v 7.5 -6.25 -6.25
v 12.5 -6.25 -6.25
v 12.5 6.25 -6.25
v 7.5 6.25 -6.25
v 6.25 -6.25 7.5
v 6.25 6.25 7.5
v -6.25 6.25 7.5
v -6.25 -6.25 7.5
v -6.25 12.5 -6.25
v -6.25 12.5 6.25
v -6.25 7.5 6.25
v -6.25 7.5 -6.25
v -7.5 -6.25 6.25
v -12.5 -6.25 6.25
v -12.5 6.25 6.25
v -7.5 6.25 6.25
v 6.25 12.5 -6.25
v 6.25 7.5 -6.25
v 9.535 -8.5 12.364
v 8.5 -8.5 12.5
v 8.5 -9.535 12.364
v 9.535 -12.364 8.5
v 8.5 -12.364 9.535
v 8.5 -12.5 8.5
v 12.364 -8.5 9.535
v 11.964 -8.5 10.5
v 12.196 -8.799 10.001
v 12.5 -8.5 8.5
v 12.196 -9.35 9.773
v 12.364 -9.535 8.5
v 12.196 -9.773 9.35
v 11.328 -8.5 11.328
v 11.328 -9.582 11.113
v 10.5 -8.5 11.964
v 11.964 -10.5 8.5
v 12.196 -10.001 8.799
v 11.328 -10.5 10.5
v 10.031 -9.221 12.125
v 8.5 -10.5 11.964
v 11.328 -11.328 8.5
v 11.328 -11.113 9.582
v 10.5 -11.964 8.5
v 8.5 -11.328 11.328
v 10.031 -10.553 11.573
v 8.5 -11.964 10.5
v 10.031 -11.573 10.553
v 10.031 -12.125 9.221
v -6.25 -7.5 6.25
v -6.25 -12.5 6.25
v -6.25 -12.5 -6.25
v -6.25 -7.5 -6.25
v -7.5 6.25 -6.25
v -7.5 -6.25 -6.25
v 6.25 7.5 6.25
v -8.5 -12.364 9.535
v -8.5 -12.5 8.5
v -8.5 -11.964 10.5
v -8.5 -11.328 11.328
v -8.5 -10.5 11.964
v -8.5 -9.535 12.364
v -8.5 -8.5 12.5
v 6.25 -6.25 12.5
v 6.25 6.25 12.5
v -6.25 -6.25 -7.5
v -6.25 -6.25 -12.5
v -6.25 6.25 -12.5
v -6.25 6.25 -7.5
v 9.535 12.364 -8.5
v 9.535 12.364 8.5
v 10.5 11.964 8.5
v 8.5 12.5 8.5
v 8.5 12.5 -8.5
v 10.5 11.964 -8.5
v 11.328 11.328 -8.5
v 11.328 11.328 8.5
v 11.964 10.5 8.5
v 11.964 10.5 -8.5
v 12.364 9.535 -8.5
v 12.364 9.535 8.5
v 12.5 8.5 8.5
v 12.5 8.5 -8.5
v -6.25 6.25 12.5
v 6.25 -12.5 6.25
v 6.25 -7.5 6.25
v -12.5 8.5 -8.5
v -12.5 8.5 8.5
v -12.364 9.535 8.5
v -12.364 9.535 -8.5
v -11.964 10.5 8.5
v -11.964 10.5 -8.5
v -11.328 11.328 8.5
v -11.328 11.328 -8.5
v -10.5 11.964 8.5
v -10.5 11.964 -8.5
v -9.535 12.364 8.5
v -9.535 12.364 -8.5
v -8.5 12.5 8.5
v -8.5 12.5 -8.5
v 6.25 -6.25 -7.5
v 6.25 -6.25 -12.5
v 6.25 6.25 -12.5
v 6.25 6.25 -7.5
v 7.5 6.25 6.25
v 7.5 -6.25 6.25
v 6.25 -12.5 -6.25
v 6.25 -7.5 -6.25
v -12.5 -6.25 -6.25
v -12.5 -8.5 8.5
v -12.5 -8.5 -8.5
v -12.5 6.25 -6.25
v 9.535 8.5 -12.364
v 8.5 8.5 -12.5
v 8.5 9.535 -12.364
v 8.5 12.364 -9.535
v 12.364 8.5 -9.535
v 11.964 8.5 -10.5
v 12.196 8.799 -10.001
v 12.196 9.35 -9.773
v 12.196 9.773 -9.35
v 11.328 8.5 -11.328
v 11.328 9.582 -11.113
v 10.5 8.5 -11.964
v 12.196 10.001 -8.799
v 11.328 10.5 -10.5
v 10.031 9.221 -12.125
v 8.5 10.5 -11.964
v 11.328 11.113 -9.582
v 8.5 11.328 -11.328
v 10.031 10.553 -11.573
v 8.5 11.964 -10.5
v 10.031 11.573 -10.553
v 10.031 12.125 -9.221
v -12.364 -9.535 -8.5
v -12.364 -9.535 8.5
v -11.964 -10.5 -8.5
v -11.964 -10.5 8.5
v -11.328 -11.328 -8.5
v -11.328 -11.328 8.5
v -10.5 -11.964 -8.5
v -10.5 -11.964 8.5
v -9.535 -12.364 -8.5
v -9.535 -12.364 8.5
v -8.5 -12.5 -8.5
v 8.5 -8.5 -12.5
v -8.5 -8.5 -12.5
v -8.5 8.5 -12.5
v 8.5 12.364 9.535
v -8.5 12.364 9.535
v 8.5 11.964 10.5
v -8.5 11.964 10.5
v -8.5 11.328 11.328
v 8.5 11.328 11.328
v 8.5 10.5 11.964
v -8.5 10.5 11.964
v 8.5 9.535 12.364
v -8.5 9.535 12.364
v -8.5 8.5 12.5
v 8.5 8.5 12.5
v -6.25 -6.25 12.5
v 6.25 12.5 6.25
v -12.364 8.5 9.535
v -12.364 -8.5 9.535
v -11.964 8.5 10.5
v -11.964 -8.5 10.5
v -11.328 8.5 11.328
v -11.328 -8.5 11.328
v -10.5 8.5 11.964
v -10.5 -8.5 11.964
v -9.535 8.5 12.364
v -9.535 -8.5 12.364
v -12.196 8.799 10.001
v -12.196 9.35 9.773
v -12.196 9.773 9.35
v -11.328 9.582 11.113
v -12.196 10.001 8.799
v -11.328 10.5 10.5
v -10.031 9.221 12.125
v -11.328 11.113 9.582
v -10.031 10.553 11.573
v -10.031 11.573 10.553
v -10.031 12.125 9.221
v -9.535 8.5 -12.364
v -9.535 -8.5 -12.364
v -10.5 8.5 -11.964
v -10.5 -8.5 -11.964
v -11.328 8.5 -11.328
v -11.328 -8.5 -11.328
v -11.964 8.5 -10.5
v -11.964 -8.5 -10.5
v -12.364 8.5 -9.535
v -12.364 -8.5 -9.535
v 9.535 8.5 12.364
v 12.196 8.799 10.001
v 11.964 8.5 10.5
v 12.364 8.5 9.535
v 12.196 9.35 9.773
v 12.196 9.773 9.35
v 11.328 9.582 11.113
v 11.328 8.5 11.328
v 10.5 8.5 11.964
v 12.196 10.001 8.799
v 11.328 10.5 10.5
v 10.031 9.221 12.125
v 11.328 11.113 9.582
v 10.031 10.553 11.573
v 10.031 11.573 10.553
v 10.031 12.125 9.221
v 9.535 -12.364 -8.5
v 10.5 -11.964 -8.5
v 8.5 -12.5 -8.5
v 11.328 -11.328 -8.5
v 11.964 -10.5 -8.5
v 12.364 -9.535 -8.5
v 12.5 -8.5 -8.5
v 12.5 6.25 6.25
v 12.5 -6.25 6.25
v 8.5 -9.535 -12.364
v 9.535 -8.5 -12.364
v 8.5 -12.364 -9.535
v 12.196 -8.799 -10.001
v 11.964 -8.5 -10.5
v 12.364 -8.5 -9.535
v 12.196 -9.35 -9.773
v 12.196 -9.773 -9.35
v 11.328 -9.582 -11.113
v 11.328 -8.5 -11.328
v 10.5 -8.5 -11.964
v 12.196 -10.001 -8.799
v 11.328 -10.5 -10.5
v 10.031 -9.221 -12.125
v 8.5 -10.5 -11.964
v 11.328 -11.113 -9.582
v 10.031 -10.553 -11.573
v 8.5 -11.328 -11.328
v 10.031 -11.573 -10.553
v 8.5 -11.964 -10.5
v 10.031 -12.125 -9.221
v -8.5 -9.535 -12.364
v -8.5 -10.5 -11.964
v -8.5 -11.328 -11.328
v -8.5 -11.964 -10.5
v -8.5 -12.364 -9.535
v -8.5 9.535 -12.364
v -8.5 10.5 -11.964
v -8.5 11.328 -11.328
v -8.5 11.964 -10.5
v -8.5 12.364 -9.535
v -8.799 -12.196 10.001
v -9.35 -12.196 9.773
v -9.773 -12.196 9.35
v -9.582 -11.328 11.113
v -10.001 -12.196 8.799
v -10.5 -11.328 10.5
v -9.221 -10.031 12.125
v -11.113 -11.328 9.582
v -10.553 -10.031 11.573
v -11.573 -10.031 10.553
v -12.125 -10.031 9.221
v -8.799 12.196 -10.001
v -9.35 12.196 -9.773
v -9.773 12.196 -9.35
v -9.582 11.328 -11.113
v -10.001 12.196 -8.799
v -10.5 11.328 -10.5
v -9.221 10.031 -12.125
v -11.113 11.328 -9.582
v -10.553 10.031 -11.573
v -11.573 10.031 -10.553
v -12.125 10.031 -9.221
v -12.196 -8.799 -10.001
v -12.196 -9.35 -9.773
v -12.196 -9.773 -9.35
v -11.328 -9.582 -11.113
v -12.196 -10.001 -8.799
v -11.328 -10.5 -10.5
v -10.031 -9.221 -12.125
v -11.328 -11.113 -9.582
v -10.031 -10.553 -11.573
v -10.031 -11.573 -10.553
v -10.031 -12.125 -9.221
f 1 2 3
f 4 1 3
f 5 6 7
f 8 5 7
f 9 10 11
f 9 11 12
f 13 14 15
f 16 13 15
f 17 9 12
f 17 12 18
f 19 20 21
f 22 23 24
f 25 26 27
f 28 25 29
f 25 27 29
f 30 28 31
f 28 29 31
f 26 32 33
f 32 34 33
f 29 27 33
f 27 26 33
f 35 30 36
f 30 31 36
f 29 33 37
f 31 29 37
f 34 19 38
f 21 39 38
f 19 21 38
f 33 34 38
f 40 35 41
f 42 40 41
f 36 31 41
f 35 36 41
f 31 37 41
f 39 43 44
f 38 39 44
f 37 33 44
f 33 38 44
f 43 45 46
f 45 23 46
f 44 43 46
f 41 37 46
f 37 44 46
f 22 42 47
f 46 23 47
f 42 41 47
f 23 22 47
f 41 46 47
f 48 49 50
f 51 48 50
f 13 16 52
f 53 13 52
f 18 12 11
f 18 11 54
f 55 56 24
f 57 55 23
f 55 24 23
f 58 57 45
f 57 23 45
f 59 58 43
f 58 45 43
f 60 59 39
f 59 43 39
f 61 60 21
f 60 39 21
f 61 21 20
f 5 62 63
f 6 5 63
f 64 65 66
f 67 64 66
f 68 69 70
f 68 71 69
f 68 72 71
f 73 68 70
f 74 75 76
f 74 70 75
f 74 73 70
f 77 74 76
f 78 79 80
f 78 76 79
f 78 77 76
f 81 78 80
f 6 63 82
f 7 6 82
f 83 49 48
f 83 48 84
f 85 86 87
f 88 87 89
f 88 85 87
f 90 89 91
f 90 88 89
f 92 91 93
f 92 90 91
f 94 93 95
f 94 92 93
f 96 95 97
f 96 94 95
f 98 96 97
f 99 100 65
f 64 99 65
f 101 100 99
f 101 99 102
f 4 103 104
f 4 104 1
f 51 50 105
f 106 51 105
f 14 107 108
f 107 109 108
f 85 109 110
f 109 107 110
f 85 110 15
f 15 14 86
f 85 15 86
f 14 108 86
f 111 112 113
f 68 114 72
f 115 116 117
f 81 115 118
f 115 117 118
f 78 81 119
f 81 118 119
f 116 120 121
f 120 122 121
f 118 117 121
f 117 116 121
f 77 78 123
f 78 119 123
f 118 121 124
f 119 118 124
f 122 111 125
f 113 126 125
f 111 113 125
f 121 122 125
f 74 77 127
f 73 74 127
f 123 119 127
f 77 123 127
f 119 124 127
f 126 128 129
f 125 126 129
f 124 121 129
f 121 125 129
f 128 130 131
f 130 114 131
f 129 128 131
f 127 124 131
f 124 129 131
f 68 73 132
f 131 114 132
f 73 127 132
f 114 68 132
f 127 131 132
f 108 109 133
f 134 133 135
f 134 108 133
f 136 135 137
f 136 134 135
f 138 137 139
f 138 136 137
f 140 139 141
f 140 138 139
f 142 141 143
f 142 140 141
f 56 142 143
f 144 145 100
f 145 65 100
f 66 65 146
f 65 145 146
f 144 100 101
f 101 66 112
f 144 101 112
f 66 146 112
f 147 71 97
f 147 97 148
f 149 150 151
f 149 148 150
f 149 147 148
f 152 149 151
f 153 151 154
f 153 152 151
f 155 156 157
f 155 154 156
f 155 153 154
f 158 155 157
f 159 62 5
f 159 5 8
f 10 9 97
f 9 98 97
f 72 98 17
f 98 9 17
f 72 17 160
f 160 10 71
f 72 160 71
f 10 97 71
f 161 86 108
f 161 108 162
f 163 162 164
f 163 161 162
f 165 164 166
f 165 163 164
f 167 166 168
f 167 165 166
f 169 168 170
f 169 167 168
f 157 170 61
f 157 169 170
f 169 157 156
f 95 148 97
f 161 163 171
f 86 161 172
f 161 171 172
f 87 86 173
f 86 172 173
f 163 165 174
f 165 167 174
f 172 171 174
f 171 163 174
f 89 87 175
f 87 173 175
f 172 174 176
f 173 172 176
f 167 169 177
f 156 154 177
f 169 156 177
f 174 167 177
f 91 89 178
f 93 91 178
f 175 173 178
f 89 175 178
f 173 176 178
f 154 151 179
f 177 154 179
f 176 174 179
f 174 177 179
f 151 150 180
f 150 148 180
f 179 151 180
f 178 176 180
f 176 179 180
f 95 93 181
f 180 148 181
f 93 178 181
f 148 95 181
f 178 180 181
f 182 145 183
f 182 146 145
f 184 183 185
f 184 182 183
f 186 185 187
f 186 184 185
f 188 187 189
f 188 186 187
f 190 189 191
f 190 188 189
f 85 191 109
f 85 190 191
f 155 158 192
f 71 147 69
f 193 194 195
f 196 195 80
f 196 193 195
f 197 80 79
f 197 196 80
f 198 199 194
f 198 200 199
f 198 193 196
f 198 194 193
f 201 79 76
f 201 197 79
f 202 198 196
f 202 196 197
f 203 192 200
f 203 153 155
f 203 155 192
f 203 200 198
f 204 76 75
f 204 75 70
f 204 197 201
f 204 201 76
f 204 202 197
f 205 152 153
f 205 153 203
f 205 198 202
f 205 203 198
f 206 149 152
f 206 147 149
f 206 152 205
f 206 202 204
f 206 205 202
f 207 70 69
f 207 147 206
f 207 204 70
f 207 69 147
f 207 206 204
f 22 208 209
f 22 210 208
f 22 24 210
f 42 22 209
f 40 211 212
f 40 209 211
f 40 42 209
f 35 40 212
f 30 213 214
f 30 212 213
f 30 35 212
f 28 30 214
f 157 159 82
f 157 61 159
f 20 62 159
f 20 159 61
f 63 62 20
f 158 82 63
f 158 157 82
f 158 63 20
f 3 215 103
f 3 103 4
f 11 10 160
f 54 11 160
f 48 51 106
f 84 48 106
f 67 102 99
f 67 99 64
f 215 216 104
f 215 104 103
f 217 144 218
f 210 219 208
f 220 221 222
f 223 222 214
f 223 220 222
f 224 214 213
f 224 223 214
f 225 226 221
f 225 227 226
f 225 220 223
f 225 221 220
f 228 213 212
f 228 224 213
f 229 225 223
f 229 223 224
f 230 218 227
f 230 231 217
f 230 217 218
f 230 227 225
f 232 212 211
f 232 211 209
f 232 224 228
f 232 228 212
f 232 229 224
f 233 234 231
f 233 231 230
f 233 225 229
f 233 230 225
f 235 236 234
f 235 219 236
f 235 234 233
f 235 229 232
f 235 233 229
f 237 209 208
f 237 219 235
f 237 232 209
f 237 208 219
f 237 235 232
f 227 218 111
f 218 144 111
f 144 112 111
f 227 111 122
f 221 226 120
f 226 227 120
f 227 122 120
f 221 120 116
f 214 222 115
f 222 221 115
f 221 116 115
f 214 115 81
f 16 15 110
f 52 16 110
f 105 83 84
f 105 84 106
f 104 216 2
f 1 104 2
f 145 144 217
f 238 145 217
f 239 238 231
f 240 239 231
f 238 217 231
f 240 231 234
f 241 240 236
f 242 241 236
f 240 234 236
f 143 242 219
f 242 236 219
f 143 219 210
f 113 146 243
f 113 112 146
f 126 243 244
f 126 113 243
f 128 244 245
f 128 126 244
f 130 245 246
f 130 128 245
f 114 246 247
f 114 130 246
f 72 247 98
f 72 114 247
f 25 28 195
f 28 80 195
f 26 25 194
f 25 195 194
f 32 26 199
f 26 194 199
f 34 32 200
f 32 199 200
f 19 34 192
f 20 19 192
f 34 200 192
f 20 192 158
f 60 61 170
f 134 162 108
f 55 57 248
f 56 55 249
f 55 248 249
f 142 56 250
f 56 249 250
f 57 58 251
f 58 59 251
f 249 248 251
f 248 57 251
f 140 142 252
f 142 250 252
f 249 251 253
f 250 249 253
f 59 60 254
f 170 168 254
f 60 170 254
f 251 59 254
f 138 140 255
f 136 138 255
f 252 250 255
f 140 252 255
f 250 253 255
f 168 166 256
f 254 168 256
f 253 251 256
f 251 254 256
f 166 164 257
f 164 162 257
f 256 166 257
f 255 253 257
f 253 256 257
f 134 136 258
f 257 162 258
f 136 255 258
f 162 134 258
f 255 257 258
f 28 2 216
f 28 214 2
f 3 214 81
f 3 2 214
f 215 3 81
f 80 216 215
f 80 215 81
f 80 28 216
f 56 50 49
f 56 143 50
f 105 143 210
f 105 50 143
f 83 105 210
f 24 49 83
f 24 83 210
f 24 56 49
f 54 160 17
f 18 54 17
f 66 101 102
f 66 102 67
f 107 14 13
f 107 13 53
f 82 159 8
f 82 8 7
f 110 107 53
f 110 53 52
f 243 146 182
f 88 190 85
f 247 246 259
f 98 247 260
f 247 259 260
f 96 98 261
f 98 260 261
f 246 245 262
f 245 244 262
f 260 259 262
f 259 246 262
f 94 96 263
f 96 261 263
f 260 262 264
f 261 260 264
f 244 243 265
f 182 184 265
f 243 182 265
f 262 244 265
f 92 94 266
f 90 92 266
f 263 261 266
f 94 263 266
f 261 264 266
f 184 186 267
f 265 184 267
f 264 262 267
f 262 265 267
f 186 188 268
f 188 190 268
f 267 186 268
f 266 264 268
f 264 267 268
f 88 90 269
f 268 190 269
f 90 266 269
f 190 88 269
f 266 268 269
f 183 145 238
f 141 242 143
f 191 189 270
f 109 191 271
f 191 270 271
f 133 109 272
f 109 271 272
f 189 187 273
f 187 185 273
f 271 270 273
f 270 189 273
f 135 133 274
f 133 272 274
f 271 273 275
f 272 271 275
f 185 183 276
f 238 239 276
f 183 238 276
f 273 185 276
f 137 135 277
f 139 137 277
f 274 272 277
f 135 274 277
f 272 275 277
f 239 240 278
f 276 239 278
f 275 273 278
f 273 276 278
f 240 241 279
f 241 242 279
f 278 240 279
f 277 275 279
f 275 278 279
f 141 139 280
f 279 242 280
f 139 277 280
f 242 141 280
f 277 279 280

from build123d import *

# Parameters (mm, degrees)
SKETCH1_W           = 25
SKETCH1_H           = 25
SKETCH1_W_2         = 12.5
SKETCH1_H_2         = 12.5
BOSS_EXTRUDE1_DEPTH = 12.5
SKETCH2_W           = 12.5
SKETCH2_H           = 12.5
CUT_EXTRUDE1_DEPTH  = 5
SKETCH3_W           = 12.5
SKETCH3_H           = 12.5
CUT_EXTRUDE2_DEPTH  = 5
SKETCH4_W           = 12.5
SKETCH4_H           = 12.5
CUT_EXTRUDE3_DEPTH  = 5
FILLET1_R           = 4


with BuildPart() as part:
    # Sketch1 → Boss-Extrude1 (new, symmetric)
    # profile 1 of 2: a face of its own
    with BuildSketch(Plane.XY):
        Rectangle(SKETCH1_W, SKETCH1_H)
        Rectangle(SKETCH1_W_2, SKETCH1_H_2, mode=Mode.SUBTRACT)
    # profile 2 of 2: a face of its own
    with BuildSketch(Plane.XY):
        Rectangle(SKETCH1_W_2, SKETCH1_H_2)
    extrude(amount=BOSS_EXTRUDE1_DEPTH, both=True)

    # Sketch2 → Cut-Extrude1 (cut)
    with BuildSketch(Plane(origin=(0, 0, -12.5), x_dir=(-1, 0, 0), z_dir=(0, 0, -1))):
        Rectangle(SKETCH2_W, SKETCH2_H)
    cut_extrude1 = extrude(amount=-CUT_EXTRUDE1_DEPTH, mode=Mode.SUBTRACT)

    # Mirror1: Cut-Extrude1 across plane
    add(cut_extrude1.mirror(Plane.XY), mode=Mode.SUBTRACT)

    # Sketch3 → Cut-Extrude2 (cut)
    with BuildSketch(Plane(origin=(0, 12.5, 0), x_dir=(1, 0, 0), z_dir=(0, 1, 0))):
        Rectangle(SKETCH3_W, SKETCH3_H)
    cut_extrude2 = extrude(amount=-CUT_EXTRUDE2_DEPTH, mode=Mode.SUBTRACT)

    # Sketch4 → Cut-Extrude3 (cut)
    with BuildSketch(Plane(origin=(12.5, 0, 0), x_dir=(0, 0, -1), z_dir=(1, 0, 0))):
        Rectangle(SKETCH4_W, SKETCH4_H)
    cut_extrude3 = extrude(amount=-CUT_EXTRUDE3_DEPTH, mode=Mode.SUBTRACT)

    # Mirror2: Cut-Extrude3 across plane
    add(cut_extrude3.mirror(Plane(origin=(0, 0, 0), x_dir=(0, 0, 1), z_dir=(1, 0, 0))), mode=Mode.SUBTRACT)

    # Mirror3: Cut-Extrude2 across plane
    add(cut_extrude2.mirror(Plane.ZX), mode=Mode.SUBTRACT)

    # Fillet1
    fillet1_edges = [part.edges().sort_by_distance(p)[0] for p in [
        (0, 12.5, 12.5),
        (-12.5, 0, 12.5),
        (0, -12.5, 12.5),
        (12.5, 0, 12.5),
        (0, -12.5, -12.5),
        (-12.5, 0, -12.5),
        (0, 12.5, -12.5),
        (12.5, 0, -12.5),
        (12.5, -12.5, 0),
        (-12.5, -12.5, 0),
        (-12.5, 12.5, 0),
        (12.5, 12.5, 0),
    ]]
    fillet(fillet1_edges, radius=FILLET1_R)


solid = part.part
